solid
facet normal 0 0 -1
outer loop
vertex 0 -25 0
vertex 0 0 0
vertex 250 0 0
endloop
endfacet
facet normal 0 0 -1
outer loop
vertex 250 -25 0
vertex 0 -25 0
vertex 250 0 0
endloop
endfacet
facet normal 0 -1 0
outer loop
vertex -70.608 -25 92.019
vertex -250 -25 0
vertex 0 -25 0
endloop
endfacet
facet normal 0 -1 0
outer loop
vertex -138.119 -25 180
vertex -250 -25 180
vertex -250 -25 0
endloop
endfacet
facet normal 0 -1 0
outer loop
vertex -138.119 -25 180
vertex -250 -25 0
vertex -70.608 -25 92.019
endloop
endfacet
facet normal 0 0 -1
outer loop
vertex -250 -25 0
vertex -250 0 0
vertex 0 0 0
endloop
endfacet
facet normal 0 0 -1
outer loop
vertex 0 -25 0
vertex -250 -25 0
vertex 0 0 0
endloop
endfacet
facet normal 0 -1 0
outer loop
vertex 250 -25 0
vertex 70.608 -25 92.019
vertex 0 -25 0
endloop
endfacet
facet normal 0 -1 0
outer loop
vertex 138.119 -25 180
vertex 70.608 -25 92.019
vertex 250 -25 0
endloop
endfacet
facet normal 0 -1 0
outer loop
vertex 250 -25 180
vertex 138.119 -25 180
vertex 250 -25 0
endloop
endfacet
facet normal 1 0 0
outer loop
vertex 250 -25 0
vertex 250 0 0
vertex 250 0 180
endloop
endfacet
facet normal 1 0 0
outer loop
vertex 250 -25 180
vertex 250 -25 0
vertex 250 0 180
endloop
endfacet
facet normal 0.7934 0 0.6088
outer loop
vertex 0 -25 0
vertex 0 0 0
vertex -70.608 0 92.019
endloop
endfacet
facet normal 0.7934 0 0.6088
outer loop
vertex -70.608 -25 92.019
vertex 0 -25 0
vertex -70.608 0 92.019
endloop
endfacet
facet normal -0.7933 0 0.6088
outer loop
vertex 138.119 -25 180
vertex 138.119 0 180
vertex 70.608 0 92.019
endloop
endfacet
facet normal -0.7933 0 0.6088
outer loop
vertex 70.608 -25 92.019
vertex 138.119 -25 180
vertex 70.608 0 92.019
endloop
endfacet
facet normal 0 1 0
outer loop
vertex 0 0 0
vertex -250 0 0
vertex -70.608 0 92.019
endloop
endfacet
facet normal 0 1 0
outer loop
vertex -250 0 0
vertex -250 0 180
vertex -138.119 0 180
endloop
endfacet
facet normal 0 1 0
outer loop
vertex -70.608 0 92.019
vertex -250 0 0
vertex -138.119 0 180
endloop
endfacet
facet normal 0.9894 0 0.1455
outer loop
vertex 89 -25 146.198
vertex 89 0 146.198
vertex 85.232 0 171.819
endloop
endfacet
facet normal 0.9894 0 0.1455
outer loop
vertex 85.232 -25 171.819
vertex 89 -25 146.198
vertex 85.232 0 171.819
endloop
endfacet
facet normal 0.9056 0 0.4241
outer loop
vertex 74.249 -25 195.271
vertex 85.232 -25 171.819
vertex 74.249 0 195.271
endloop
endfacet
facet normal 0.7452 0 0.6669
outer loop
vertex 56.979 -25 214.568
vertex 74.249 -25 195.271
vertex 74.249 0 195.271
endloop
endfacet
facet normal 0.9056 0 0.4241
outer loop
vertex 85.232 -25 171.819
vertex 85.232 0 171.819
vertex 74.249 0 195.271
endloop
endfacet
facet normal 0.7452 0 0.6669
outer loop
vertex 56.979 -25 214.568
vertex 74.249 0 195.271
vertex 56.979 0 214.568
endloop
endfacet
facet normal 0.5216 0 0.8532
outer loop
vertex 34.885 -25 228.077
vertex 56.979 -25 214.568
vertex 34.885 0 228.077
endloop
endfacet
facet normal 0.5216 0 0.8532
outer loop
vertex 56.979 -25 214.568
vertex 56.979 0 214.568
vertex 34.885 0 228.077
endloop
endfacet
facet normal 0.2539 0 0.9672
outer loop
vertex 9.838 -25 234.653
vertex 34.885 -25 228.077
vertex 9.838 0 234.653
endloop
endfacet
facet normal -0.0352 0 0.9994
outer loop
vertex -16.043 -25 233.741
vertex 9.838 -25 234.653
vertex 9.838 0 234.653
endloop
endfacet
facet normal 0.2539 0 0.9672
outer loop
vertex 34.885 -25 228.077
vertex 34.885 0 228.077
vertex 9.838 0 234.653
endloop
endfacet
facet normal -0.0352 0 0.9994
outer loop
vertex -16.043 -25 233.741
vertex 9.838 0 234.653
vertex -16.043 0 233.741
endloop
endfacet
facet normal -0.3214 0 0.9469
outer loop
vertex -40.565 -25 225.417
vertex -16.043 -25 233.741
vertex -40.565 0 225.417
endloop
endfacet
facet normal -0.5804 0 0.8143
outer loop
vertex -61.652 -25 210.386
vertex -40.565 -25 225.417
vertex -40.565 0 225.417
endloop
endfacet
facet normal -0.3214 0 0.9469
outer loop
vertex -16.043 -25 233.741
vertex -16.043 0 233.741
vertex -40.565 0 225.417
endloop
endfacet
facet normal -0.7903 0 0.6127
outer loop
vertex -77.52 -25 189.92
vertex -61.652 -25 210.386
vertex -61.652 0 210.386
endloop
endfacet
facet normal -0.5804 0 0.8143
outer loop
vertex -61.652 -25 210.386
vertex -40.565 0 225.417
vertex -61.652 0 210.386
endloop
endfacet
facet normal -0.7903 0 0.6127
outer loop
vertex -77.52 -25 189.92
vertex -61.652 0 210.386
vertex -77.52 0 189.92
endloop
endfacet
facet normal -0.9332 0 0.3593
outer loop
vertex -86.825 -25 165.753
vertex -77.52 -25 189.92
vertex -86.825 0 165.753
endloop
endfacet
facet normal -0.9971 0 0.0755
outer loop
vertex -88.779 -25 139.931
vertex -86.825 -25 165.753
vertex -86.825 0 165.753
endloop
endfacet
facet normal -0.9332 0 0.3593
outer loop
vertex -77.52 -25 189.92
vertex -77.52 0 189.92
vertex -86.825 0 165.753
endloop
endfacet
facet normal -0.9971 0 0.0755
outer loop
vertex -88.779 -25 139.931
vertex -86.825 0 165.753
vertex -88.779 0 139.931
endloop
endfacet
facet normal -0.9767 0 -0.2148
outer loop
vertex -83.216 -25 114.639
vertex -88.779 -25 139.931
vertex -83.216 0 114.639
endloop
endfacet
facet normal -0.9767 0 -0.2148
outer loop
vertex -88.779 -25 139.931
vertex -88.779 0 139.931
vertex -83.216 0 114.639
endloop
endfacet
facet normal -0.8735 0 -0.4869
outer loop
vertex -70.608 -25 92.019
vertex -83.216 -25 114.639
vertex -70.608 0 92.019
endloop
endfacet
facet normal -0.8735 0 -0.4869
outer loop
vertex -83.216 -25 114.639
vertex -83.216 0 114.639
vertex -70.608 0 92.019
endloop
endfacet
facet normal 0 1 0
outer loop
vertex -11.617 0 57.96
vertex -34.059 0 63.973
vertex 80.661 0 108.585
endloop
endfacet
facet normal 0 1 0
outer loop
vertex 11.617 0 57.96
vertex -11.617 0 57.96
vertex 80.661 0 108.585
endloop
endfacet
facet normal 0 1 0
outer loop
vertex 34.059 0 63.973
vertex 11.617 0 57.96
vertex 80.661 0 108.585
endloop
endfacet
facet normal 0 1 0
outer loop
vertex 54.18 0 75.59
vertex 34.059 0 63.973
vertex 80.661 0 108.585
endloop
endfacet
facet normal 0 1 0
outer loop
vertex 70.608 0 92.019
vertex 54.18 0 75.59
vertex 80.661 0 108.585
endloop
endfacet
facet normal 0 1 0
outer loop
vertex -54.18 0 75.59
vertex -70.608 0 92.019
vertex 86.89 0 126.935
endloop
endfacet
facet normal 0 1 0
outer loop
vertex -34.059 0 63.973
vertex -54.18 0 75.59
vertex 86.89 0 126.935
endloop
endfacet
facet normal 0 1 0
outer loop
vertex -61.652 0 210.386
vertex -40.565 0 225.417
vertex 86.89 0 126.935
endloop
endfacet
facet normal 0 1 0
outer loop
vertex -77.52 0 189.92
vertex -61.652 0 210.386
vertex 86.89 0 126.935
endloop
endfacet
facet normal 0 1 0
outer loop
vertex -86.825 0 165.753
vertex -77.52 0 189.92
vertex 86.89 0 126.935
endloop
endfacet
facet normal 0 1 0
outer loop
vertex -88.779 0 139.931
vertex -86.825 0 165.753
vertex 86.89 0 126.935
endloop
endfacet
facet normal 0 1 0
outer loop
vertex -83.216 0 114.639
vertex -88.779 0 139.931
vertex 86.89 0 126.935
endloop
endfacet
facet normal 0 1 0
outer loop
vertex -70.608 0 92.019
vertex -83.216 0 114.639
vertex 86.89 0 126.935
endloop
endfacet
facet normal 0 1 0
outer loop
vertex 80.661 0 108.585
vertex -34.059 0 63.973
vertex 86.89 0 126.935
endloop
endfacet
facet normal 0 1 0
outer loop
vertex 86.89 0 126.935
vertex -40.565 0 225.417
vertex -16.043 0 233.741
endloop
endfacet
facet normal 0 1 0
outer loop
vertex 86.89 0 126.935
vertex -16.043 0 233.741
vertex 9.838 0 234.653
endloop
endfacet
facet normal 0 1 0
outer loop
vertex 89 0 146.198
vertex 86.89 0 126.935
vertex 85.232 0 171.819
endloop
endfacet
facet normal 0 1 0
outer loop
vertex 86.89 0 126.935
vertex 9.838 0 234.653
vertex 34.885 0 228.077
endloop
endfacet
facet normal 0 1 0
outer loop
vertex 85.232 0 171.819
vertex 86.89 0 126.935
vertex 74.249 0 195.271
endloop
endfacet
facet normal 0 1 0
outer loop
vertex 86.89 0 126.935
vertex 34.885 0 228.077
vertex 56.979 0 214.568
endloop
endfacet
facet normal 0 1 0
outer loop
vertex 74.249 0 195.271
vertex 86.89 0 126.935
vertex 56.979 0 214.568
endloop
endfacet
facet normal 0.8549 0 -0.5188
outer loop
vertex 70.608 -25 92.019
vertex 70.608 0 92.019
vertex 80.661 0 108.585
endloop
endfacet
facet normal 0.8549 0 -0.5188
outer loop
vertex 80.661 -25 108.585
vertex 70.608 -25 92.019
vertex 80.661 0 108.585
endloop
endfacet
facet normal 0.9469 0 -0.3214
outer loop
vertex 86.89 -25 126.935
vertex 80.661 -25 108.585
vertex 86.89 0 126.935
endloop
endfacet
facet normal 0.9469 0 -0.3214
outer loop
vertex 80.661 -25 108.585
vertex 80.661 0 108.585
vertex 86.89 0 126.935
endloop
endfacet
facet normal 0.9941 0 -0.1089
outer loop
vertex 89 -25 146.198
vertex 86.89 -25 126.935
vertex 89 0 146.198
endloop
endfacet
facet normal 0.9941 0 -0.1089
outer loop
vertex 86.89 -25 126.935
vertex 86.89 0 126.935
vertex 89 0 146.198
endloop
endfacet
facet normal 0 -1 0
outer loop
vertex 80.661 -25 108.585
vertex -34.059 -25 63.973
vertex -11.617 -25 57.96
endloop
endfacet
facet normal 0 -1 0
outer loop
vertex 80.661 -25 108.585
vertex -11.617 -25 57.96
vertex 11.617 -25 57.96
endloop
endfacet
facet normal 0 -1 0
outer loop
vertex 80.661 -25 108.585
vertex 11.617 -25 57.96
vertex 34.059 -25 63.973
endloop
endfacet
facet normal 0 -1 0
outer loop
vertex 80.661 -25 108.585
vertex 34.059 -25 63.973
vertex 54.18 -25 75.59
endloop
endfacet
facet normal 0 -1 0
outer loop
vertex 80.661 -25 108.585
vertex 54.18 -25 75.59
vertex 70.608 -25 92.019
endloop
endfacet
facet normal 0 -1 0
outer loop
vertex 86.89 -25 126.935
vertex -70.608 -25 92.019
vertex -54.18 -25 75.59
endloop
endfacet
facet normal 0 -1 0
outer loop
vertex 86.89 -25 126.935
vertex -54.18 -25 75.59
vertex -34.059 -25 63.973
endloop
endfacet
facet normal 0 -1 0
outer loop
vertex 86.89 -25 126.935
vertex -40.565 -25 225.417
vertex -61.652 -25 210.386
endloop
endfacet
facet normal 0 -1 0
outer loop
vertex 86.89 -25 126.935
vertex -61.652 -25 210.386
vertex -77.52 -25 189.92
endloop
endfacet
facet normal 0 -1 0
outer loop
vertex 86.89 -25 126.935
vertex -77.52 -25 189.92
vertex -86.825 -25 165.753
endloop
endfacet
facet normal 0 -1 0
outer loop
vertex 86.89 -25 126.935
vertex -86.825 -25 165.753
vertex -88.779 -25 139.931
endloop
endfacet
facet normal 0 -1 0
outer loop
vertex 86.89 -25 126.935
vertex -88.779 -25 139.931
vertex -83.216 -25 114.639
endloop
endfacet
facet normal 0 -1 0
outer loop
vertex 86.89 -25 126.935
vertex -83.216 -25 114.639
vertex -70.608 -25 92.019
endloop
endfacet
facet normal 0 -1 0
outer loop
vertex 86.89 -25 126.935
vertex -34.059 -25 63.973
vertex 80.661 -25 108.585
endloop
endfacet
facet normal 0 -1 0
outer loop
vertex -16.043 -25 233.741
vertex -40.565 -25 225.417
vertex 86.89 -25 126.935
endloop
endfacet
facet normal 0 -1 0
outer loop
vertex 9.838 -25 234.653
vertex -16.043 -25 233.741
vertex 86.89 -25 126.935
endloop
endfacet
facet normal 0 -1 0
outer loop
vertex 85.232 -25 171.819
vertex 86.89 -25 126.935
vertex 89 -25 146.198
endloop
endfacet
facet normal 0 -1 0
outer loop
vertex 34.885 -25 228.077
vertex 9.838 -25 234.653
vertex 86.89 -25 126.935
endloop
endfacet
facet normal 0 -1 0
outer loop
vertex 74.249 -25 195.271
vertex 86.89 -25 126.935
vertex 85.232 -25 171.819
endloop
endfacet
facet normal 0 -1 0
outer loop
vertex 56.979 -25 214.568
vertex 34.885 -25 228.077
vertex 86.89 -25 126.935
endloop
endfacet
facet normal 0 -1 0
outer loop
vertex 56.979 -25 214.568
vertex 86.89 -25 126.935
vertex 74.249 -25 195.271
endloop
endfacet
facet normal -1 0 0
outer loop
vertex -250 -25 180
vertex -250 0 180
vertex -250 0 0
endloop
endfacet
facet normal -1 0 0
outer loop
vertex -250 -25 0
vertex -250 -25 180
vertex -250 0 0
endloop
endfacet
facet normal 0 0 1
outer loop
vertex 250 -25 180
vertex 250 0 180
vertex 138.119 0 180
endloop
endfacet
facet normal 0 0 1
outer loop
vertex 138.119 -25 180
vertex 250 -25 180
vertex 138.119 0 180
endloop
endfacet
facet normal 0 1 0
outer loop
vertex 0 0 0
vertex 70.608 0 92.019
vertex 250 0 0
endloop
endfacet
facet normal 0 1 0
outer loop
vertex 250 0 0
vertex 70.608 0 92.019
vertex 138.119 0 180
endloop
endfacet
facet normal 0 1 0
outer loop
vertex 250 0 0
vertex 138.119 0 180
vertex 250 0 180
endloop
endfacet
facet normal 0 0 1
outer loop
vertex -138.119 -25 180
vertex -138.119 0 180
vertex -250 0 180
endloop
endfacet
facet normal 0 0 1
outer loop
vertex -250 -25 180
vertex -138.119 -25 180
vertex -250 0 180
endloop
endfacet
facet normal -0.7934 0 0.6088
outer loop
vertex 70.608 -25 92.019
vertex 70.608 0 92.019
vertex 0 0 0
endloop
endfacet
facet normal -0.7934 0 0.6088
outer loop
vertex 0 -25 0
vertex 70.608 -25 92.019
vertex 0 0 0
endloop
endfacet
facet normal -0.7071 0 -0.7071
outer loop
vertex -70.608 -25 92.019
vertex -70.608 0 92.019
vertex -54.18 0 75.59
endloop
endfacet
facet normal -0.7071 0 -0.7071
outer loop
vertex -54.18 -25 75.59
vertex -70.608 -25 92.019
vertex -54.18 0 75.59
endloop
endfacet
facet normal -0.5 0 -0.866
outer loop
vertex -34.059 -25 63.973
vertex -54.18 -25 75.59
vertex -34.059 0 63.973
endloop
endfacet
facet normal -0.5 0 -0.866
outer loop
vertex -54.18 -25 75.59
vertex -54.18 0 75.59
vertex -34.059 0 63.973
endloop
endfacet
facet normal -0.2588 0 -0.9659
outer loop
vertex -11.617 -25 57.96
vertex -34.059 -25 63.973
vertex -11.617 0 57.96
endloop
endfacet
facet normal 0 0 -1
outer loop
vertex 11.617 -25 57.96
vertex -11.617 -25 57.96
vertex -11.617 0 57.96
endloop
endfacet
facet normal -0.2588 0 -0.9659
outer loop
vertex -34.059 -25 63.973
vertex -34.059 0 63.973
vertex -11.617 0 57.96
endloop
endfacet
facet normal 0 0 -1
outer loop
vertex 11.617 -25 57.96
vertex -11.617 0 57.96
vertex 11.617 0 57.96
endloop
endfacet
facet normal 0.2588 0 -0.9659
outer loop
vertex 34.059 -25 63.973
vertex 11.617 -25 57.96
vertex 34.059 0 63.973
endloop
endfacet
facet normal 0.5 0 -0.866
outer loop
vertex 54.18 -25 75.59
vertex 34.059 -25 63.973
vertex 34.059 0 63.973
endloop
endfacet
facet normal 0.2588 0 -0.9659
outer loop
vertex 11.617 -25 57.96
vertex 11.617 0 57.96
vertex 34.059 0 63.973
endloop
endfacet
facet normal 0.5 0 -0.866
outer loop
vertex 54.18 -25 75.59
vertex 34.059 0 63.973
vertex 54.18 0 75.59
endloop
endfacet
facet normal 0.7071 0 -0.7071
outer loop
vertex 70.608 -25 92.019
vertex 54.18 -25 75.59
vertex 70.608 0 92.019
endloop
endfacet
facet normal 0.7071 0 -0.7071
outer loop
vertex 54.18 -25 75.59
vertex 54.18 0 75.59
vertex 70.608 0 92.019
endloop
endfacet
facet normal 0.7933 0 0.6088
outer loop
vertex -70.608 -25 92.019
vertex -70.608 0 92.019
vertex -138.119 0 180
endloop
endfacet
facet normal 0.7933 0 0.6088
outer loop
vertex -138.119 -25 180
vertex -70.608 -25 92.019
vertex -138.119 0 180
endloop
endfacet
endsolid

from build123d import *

# Parameters (mm, degrees)
F1_DEPTH = 25
F2_DEPTH = 25


with BuildPart() as f1:
    # F0 (on Front) → F1 (new body)
    with BuildSketch(Plane.XZ):
        with BuildLine():
            ThreePointArc((-70.608447, 92.01872), (-1e-06, 57.198487), (70.608447, 92.018719))
            ThreePointArc((70.608447, 92.018719), (84.276781, 117.590374), (89, 146.198487))
            ThreePointArc((89, 146.198487), (-28.608112, 230.475269), (-70.608447, 92.01872))
        make_face()
    extrude(amount=F1_DEPTH)

    # F0 (on Front) → F2 (join)
    with BuildSketch(Plane.XZ):
        Polygon((-250, 0), (0, 0), (-70.608447, 92.01872), (-138.118858, 180), (-250, 180), align=None)
        Polygon((70.608447, 92.018719), (0, 0), (250, 0), (250, 180), (138.118858, 180), align=None)
    extrude(amount=F2_DEPTH)


solid = f1.part
